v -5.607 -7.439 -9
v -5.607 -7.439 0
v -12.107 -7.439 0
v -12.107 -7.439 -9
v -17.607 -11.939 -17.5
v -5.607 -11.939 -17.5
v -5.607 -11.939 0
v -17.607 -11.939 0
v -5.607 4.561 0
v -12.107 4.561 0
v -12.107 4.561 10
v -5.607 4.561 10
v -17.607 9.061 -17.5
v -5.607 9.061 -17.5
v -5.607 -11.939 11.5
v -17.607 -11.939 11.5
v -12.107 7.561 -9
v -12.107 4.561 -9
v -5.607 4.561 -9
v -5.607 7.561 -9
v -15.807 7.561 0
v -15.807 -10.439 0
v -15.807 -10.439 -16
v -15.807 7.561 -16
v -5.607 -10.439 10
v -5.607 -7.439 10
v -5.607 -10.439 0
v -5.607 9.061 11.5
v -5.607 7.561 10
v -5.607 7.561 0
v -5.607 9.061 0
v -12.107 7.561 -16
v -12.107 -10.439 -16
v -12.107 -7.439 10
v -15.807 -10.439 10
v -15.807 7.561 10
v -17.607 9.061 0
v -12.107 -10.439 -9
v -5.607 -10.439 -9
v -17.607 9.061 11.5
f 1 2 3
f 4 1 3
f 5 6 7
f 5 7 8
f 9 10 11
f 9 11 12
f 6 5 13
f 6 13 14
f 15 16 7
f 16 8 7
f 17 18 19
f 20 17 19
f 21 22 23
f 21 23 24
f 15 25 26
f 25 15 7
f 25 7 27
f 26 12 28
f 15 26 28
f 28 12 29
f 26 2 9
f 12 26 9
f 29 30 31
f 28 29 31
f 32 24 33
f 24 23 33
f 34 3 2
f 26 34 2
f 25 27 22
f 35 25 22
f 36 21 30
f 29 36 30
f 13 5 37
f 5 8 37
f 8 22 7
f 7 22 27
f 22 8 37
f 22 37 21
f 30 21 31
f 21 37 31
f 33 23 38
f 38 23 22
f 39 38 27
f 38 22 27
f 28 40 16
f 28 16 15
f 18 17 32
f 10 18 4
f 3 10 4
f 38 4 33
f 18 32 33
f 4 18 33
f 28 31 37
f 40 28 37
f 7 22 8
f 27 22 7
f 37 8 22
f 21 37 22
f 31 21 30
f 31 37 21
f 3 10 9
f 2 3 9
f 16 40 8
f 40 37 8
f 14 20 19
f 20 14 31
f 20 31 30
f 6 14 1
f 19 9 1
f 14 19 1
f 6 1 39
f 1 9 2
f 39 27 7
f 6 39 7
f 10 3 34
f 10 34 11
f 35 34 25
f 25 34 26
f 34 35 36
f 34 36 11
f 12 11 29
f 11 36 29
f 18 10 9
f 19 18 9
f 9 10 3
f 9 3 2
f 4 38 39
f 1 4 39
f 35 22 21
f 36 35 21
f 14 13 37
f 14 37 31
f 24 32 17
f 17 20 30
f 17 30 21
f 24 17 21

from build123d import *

# Parameters (mm, degrees)
F1_DEPTH = 10
F0_W     = 6.5
F0_H     = 12
F2_W     = 10.2
F2_H     = 18
F3_DEPTH = 1.5
F4_DEPTH = 16
F6_DEPTH = 1.5
F5_W     = 6.5
F5_H     = 3
F7_DEPTH = 1.5
F8_DEPTH = 7


# Not quite as in the source:
# - a feature names something its author has since deleted; it is built from what else it names


with BuildPart() as f1:
    # F0 (on Top) → F1 (new body)
    with BuildSketch(Plane.XY):
        Polygon((-5.6070076972, 9.0611978821), (-17.6070076972, 9.0611978821), (-17.6070076972, -11.9388021179), (-5.6070076972, -11.9388021179), (-5.6070076972, -10.4388021179), (-15.8070076972, -10.4388021179), (-15.8070076972, 7.5611978821), (-5.6070076972, 7.5611978821), align=None)
    extrude(amount=F1_DEPTH)



with BuildPart() as f1b:
    # F0 (on Top) → F1, piece 2 (new body)
    with BuildSketch(Plane.XY):
        with Locations((-8.8570076972, -1.4388021179)):
            Rectangle(F0_W, F0_H)
    extrude(amount=F1_DEPTH)


with BuildPart() as f1_1:
    add(f1.part)

    add(f1b.part)  # F3 merges F1b
    # F2 (on face) → F3 (join)
    with BuildSketch(Plane.XY.offset(10)):
        Polygon((-5.6070076972, 9.0611978821), (-17.6070076972, 9.0611978821), (-17.6070076972, -11.9388021179), (-5.6070076972, -11.9388021179), (-5.6070076972, -10.4388021179), (-15.8070076972, -10.4388021179), (-15.8070076972, 7.5611978821), (-5.6070076972, 7.5611978821), align=None)
        with Locations((-10.7070076972, -1.4388021179)):
            Rectangle(F2_W, F2_H)
    extrude(amount=F3_DEPTH)


with BuildPart() as f4:
    # F0 (on Top) → F4 (new body)
    with BuildSketch(Plane.XY):
        Polygon((-5.6070076972, 9.0611978821), (-17.6070076972, 9.0611978821), (-17.6070076972, -11.9388021179), (-5.6070076972, -11.9388021179), (-5.6070076972, -10.4388021179), (-15.8070076972, -10.4388021179), (-15.8070076972, 7.5611978821), (-5.6070076972, 7.5611978821), align=None)
    extrude(amount=-F4_DEPTH)



with BuildPart() as f4b:
    # F0 (on Top) → F4, piece 2 (new body)
    with BuildSketch(Plane.XY):
        with Locations((-8.8570076972, -1.4388021179)):
            Rectangle(F0_W, F0_H)
    extrude(amount=-F4_DEPTH)


with BuildPart() as f4_1:
    add(f4.part)

    add(f4b.part)  # F6 merges F4b
    # F5 (on face) → F6 (join)
    with BuildSketch(Plane(origin=(0, 0, -16), x_dir=(1, 0, 0), z_dir=(0, 0, -1))):
        Polygon((-5.6070076972, 11.9388021179), (-17.6070076972, 11.9388021179), (-17.6070076972, -9.0611978821), (-5.6070076972, -9.0611978821), (-5.6070076972, -7.5611978821), (-12.1070076972, -7.5611978821), (-15.8070076972, -7.5611978821), (-15.8070076972, 10.4388021179), (-12.1070076972, 10.4388021179), (-5.6070076972, 10.4388021179), align=None)
        Polygon((-5.6070076972, -4.5611978821), (-5.6070076972, 7.4388021179), (-12.1070076972, 7.4388021179), (-12.1070076972, 10.4388021179), (-15.8070076972, 10.4388021179), (-15.8070076972, -7.5611978821), (-12.1070076972, -7.5611978821), (-12.1070076972, -4.5611978821), align=None)
    extrude(amount=F6_DEPTH)

    # F5 (on face) → F7 (join)
    with BuildSketch(Plane(origin=(0, 0, -16), x_dir=(1, 0, 0), z_dir=(0, 0, -1))):
        with Locations((-8.8570076972, -6.0611978821)):
            Rectangle(F5_W, F5_H)
        with Locations((-8.8570076972, 8.9388021179)):
            Rectangle(F5_W, F5_H)
    extrude(amount=F7_DEPTH)

    # F5 (on face) → F8 (join)
    with BuildSketch(Plane(origin=(0, 0, -16), x_dir=(1, 0, 0), z_dir=(0, 0, -1))):
        with Locations((-8.8570076972, -6.0611978821)):
            Rectangle(F5_W, F5_H)
        with Locations((-8.8570076972, 8.9388021179)):
            Rectangle(F5_W, F5_H)
    extrude(amount=-F8_DEPTH)


solid = Compound([f1_1.part, f4_1.part])
